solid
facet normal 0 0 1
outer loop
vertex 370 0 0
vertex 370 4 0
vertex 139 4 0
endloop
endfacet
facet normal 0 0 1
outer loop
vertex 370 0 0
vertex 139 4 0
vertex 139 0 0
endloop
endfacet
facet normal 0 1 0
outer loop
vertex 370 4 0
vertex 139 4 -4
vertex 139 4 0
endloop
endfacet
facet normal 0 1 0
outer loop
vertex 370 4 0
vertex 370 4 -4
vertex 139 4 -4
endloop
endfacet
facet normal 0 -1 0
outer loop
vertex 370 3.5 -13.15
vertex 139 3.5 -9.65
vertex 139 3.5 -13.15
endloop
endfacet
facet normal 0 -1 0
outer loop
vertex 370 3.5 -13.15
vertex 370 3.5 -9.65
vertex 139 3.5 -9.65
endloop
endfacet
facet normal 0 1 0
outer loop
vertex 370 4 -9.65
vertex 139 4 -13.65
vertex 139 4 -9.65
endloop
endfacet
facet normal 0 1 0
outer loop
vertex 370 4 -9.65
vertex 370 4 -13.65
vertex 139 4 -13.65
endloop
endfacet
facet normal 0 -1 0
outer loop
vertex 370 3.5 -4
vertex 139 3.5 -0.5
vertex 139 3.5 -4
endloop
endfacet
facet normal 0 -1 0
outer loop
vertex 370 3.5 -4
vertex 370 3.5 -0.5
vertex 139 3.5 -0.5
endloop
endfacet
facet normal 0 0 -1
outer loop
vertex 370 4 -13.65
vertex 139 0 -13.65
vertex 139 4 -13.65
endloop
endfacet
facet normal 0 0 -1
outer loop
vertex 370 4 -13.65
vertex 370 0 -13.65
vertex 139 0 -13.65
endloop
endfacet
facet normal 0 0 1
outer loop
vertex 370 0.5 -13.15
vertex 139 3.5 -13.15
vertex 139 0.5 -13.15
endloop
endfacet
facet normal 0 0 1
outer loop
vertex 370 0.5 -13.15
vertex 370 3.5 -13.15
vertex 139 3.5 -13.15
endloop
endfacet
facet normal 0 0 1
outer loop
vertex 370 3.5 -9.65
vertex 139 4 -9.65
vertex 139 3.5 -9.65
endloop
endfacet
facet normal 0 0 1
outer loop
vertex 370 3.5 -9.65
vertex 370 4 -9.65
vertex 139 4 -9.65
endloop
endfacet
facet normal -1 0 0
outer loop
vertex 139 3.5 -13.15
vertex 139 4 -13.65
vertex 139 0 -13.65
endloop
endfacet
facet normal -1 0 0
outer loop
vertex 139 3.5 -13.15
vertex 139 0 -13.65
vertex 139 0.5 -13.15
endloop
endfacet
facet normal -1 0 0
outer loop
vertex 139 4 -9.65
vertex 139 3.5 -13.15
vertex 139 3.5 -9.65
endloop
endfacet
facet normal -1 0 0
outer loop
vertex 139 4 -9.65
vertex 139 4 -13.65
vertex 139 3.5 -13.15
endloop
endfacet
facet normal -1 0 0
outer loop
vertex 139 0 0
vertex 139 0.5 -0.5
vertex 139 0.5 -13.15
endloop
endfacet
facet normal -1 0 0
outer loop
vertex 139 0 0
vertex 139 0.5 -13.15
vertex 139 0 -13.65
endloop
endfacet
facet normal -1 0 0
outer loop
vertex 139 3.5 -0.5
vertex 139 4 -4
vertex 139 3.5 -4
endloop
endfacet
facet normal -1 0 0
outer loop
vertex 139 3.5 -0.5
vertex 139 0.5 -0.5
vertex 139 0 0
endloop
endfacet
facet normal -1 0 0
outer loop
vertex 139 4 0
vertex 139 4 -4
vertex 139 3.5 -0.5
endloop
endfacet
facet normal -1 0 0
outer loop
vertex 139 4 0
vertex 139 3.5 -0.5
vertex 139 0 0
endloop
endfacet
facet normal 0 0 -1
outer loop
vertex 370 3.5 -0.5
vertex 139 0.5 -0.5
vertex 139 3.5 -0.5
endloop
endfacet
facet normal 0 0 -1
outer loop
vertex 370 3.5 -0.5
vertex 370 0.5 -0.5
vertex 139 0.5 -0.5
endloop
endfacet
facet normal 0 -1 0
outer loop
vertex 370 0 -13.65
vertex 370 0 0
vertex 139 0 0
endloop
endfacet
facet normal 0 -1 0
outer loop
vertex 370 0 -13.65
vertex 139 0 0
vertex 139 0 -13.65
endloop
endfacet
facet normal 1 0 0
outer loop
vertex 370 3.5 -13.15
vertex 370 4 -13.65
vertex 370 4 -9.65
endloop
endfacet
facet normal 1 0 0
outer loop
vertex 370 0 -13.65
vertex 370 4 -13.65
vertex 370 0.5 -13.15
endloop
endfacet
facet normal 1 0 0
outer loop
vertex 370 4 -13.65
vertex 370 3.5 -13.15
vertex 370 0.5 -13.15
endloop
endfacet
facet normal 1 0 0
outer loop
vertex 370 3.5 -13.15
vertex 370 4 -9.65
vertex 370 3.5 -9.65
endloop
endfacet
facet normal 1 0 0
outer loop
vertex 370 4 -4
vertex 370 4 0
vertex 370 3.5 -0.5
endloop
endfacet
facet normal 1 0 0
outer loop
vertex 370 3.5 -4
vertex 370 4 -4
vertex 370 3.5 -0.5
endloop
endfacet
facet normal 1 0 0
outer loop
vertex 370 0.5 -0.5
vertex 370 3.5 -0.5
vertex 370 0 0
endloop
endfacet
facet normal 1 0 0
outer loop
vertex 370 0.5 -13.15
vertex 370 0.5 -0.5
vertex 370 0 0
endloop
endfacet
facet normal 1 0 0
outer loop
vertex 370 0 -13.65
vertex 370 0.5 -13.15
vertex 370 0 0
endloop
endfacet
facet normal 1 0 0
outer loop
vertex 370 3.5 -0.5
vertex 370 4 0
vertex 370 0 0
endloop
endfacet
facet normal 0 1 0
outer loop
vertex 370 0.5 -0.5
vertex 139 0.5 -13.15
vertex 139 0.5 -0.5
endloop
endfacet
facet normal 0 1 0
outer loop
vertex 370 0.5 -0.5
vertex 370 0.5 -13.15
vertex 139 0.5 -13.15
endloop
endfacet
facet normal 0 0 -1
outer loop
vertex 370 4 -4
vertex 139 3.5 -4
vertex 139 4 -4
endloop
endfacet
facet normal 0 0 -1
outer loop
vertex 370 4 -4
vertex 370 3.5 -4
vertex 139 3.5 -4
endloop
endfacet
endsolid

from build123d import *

# Parameters (mm, degrees)
Y_KSEKLIK_EKSTR_ZYON1_DEPTH      = 370
Y_KSEKLIK_EKSTR_ZYON2_DEPTH      = 2
Y_KSEKLIK_EKSTR_ZYON2_DEPTH_BACK = 141
KES_EKSTR_ZYON1_DEPTH            = 141


with BuildPart() as part:
    # Çizim1 → Yükseklik-Ekstrüzyon1 (new body)
    with BuildSketch(Plane(origin=(0, 0, 0), x_dir=(0, -1, 0), z_dir=(-1, 0, 0))):
        Polygon((0, 0), (-4, 0), (-4, -4), (-3.5, -4), (-3.5, -0.5), (-0.5, -0.5), (-0.5, -13.15), (-3.5, -13.15), (-3.5, -9.65), (-4, -9.65), (-4, -13.65), (0, -13.65), align=None)
    extrude(amount=-Y_KSEKLIK_EKSTR_ZYON1_DEPTH)

    # Çizim3 → Yükseklik-Ekstrüzyon2 (add, two sides: drawn at the far end of the back side and taken through both)
    with BuildSketch(Plane.ZY.offset(-Y_KSEKLIK_EKSTR_ZYON2_DEPTH_BACK)):
        Polygon((-13.65, 0), (-13.65, 4), (-9.65, 4), (-9.65, 3.5), (-13.15, 3.5), (-13.15, 0.5), (-0.5, 0.5), (-0.5, 3.5), (-4, 3.5), (-4, 4), (0, 4), (0, 0), align=None)
    extrude(amount=Y_KSEKLIK_EKSTR_ZYON2_DEPTH + Y_KSEKLIK_EKSTR_ZYON2_DEPTH_BACK)

    # Çizim5 → Kes-Ekstrüzyon1 (cut)
    with BuildSketch(Plane.ZY.offset(2)):
        Polygon((-13.65, 4), (-13.65, 0), (0, 0), (0, 4), (-4, 4), (-4, 3.5), (-0.5, 3.5), (-0.5, 0.5), (-13.15, 0.5), (-13.15, 3.5), (-9.65, 3.5), (-9.65, 4), align=None)
    extrude(amount=-KES_EKSTR_ZYON1_DEPTH, mode=Mode.SUBTRACT)


solid = part.part
